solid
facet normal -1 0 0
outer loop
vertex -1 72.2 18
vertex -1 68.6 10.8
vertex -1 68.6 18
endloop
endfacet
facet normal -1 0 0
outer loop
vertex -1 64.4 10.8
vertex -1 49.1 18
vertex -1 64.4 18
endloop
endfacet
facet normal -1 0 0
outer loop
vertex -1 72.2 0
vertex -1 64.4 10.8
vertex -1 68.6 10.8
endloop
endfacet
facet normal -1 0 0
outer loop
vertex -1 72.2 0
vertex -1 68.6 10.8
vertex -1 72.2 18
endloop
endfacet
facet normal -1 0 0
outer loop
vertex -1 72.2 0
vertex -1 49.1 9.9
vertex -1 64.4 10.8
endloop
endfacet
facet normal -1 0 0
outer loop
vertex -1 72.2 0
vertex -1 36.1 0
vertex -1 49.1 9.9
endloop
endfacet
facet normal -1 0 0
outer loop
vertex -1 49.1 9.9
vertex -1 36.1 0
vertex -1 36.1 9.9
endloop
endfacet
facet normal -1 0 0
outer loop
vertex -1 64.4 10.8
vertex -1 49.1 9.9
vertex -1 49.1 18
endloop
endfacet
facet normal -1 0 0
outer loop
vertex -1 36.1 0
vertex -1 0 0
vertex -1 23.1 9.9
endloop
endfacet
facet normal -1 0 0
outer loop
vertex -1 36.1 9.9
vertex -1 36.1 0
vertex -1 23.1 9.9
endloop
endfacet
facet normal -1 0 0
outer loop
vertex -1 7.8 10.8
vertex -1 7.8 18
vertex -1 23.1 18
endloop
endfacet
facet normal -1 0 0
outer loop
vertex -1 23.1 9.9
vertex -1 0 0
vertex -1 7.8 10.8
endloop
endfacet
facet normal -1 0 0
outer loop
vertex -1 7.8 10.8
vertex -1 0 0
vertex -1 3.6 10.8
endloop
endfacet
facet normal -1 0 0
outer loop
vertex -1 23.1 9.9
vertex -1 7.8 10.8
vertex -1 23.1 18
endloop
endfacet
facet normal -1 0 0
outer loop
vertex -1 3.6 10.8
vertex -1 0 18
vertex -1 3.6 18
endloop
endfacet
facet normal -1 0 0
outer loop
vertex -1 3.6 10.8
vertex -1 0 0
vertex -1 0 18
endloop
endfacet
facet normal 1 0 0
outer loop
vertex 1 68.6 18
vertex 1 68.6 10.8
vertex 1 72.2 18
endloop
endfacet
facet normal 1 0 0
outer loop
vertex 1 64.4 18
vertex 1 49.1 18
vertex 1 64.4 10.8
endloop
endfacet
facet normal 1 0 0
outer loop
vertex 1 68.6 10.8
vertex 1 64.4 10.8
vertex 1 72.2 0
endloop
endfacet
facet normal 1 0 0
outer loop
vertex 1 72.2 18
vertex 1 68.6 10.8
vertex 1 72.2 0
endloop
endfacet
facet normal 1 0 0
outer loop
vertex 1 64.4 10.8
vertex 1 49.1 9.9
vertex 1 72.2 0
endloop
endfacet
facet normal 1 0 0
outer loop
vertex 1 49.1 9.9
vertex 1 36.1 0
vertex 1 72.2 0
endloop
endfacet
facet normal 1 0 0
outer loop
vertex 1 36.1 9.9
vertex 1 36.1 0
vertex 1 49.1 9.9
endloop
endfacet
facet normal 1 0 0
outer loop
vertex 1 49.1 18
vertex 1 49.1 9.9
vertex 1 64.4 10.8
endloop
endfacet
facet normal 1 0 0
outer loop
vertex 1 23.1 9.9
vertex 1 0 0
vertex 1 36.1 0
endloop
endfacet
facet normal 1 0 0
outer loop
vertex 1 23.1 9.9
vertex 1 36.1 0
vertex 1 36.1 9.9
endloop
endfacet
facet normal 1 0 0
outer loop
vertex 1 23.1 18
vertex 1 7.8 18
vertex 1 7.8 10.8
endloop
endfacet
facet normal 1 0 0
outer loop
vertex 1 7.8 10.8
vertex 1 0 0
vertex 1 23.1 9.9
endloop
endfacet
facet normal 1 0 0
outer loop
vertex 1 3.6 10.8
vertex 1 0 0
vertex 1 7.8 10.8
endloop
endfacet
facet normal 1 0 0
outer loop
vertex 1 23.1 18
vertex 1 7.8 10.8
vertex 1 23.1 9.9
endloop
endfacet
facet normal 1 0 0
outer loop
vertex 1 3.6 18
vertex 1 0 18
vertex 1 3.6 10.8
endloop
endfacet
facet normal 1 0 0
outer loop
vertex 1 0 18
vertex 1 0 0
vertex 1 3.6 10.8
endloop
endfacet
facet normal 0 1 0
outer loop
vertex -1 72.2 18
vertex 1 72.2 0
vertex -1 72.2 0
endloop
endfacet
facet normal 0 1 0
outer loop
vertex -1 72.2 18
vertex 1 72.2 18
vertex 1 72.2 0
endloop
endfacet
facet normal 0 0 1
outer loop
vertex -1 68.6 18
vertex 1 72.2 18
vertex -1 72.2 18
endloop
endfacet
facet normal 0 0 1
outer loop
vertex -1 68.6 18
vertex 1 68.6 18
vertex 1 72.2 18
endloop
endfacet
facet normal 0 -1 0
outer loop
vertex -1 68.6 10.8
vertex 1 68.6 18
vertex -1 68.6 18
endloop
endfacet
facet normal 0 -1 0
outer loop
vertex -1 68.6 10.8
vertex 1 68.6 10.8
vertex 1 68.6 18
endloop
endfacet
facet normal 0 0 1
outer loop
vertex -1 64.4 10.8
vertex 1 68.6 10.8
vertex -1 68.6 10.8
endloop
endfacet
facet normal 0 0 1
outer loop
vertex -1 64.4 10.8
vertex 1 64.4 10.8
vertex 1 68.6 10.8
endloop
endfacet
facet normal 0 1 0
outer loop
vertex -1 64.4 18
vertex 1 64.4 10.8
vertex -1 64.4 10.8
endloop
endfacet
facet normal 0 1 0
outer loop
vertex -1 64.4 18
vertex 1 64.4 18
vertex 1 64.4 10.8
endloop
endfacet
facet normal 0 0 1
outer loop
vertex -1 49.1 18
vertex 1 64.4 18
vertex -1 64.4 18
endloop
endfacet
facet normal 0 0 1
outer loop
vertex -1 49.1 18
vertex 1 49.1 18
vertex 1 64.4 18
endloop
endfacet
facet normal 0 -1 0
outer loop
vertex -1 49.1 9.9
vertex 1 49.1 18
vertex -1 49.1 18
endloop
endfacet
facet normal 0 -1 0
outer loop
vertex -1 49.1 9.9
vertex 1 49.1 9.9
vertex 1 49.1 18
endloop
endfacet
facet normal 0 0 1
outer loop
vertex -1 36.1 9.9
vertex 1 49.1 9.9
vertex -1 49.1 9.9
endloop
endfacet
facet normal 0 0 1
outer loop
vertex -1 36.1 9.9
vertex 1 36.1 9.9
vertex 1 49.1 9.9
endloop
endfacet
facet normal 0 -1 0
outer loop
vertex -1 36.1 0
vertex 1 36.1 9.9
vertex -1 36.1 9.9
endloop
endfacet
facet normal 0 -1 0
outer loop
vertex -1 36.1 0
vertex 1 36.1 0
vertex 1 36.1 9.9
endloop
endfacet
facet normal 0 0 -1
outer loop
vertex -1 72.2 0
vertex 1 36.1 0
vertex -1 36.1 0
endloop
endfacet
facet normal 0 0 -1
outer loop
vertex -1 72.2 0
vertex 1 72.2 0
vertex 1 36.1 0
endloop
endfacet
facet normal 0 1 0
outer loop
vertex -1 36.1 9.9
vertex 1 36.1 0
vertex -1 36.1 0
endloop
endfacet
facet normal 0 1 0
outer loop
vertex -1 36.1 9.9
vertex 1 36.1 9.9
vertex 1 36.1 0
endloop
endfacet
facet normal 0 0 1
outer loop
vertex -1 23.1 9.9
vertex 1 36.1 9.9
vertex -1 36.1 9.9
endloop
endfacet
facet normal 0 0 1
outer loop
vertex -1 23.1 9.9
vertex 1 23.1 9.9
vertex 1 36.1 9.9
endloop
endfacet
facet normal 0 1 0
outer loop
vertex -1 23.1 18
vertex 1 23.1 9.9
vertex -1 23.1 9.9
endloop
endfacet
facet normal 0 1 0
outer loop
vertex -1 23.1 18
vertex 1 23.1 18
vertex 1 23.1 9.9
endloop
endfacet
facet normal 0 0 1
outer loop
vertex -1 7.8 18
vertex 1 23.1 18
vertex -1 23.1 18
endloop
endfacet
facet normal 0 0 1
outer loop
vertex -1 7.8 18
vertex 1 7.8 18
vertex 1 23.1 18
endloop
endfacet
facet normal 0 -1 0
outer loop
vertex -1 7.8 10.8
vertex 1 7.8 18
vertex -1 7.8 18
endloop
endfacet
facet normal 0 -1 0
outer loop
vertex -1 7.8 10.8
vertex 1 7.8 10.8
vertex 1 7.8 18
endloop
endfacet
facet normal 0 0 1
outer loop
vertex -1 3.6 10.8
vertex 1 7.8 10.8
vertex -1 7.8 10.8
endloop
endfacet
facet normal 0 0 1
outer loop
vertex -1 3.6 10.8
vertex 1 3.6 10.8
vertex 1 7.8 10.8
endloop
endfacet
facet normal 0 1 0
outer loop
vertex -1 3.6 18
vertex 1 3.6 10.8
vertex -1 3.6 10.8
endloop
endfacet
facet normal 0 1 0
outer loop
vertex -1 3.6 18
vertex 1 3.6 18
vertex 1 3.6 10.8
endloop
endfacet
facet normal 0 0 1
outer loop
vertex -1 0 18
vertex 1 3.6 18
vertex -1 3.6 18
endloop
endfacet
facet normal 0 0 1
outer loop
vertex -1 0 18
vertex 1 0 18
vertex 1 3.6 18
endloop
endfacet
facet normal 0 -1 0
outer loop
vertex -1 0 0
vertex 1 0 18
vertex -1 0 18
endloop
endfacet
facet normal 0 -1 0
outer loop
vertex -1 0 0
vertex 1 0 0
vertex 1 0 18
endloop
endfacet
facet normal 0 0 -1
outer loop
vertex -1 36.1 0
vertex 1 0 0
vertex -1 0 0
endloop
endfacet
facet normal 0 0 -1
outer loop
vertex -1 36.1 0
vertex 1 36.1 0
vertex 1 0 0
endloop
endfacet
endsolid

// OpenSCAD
/**
 * Module: Sidewall for battery holder
 *
 * Author: Karim Aziiev <karim.aziiev@gmail.com>
 * License: GPL-3.0-or-later
 */

include <../../parameters.scad>

use <../../lib/functions.scad>
use <../../lib/transforms.scad>

side_wall_type = "skeleton"; // [skeleton, enclosed]
side_wall_len  = 65.0;
side_wall_h    = 18;

function side_wall_get_depth_factors(side_wall_type) =
  let (is_skeleton = side_wall_type == "skeleton",
       center_cutout_depth_factor = is_skeleton
                                    ? 0.45
                                    : 0.25,
       edge_depth_cutout_factor = is_skeleton
                                  ? 0.4
                                  : 0.2)

  [edge_depth_cutout_factor, center_cutout_depth_factor]
  ;

function side_wall_get_cutout_depths(battery_dia,
                                     type) =
  let (factors = side_wall_get_depth_factors(type),
       edge_depth_cutout_factor = factors[0],
       center_cutout_depth_factor = factors[1],
       center_cutout_depth = center_cutout_depth_factor * battery_dia,
       edge_cutout_depth = edge_depth_cutout_factor * battery_dia)

  [edge_cutout_depth, center_cutout_depth];

module battery_holder_side_wall_2d(length=side_wall_len,
                                   h=side_wall_h,
                                   center_cutout_depth=4,
                                   center_cutout_upper_len,
                                   center_cutout_lower_len,
                                   edge_cutout_start=1.8,
                                   edge_cutout_end,
                                   edge_cutout_depth=4,
                                   edge_cutout_len,
                                   max_cutout_depth,
                                   fillet_r=1) {

  half_of_len = length / 2;

  center_cutout_h = with_default(max_cutout_depth, h - center_cutout_depth);

  edge_cutout_h = h - edge_cutout_depth;

  center_upper_len = with_default(center_cutout_upper_len, 0.3 * length);
  center_lower_len = with_default(center_cutout_lower_len, center_upper_len);

  edge_cutout_len = with_default(edge_cutout_len, 0.09 * length);
  edge_cutout_end = with_default(edge_cutout_end, edge_cutout_start);

  pts_start = [[0, half_of_len],
               [0, 0],
               [-h, 0]];

  edge_cutout_pts = edge_cutout_len > 0 ?
                    [[-h, edge_cutout_start],  // 3
                     [-edge_cutout_h, edge_cutout_end],
                     [-edge_cutout_h, edge_cutout_len],
                     [-h, edge_cutout_len]]
                    : [];

  pts = concat(pts_start,
               // 3
               edge_cutout_pts,
               [[-h, half_of_len - center_upper_len / 2],
                [-center_cutout_h, half_of_len - center_lower_len / 2],
                [-center_cutout_h, half_of_len]]);

  fillet(r=fillet_r) {
    polygon(points=pts);
    translate([0, half_of_len * 2, 0]) {
      rotate([180, 0, 0]) {
        polygon(points=pts);
      }
    }
  }
}

module battery_holder_side_wall(type=side_wall_type,
                                front_rear_thickness,
                                battery_len=side_wall_len,
                                battery_dia=side_wall_h,
                                side_wall_thickness=2) {

  is_skeleton = type == "skeleton";
  depths = side_wall_get_cutout_depths(battery_dia=battery_dia,
                                       type=side_wall_type);

  center_cutout_upper_len_factor = is_skeleton ? 0.4 : 0.35;
  center_cutout_lower_len_factor = is_skeleton
                                   ? center_cutout_upper_len_factor
                                   : 0.3;

  edge_cutout_start = is_skeleton
                      ? front_rear_thickness
                      : front_rear_thickness + 0.4;
  edge_cutout_len_factor = is_skeleton ? 0.12 : 0.09;
  edge_cutout_len = edge_cutout_len_factor * battery_len;

  fillet_r = is_skeleton ? 0 : 1;

  edge_cutout_depth = depths[0];
  center_cutout_depth = depths[1];
  center_cutout_upper_len = center_cutout_upper_len_factor * battery_len;
  center_cutout_lower_len = center_cutout_lower_len_factor * battery_len;

  rotate([0, 90, 0]) {
    linear_extrude(height=side_wall_thickness, center=true) {
      battery_holder_side_wall_2d(length=battery_len + front_rear_thickness * 2,
                                  h=battery_dia,
                                  fillet_r=fillet_r,
                                  center_cutout_lower_len=center_cutout_lower_len,
                                  center_cutout_upper_len=center_cutout_upper_len,
                                  center_cutout_depth=center_cutout_depth,
                                  edge_cutout_depth=edge_cutout_depth,
                                  edge_cutout_start=edge_cutout_start,
                                  edge_cutout_len=edge_cutout_len);
    }
  }
}

battery_holder_side_wall(front_rear_thickness=battery_holder_front_rear_thickness);
